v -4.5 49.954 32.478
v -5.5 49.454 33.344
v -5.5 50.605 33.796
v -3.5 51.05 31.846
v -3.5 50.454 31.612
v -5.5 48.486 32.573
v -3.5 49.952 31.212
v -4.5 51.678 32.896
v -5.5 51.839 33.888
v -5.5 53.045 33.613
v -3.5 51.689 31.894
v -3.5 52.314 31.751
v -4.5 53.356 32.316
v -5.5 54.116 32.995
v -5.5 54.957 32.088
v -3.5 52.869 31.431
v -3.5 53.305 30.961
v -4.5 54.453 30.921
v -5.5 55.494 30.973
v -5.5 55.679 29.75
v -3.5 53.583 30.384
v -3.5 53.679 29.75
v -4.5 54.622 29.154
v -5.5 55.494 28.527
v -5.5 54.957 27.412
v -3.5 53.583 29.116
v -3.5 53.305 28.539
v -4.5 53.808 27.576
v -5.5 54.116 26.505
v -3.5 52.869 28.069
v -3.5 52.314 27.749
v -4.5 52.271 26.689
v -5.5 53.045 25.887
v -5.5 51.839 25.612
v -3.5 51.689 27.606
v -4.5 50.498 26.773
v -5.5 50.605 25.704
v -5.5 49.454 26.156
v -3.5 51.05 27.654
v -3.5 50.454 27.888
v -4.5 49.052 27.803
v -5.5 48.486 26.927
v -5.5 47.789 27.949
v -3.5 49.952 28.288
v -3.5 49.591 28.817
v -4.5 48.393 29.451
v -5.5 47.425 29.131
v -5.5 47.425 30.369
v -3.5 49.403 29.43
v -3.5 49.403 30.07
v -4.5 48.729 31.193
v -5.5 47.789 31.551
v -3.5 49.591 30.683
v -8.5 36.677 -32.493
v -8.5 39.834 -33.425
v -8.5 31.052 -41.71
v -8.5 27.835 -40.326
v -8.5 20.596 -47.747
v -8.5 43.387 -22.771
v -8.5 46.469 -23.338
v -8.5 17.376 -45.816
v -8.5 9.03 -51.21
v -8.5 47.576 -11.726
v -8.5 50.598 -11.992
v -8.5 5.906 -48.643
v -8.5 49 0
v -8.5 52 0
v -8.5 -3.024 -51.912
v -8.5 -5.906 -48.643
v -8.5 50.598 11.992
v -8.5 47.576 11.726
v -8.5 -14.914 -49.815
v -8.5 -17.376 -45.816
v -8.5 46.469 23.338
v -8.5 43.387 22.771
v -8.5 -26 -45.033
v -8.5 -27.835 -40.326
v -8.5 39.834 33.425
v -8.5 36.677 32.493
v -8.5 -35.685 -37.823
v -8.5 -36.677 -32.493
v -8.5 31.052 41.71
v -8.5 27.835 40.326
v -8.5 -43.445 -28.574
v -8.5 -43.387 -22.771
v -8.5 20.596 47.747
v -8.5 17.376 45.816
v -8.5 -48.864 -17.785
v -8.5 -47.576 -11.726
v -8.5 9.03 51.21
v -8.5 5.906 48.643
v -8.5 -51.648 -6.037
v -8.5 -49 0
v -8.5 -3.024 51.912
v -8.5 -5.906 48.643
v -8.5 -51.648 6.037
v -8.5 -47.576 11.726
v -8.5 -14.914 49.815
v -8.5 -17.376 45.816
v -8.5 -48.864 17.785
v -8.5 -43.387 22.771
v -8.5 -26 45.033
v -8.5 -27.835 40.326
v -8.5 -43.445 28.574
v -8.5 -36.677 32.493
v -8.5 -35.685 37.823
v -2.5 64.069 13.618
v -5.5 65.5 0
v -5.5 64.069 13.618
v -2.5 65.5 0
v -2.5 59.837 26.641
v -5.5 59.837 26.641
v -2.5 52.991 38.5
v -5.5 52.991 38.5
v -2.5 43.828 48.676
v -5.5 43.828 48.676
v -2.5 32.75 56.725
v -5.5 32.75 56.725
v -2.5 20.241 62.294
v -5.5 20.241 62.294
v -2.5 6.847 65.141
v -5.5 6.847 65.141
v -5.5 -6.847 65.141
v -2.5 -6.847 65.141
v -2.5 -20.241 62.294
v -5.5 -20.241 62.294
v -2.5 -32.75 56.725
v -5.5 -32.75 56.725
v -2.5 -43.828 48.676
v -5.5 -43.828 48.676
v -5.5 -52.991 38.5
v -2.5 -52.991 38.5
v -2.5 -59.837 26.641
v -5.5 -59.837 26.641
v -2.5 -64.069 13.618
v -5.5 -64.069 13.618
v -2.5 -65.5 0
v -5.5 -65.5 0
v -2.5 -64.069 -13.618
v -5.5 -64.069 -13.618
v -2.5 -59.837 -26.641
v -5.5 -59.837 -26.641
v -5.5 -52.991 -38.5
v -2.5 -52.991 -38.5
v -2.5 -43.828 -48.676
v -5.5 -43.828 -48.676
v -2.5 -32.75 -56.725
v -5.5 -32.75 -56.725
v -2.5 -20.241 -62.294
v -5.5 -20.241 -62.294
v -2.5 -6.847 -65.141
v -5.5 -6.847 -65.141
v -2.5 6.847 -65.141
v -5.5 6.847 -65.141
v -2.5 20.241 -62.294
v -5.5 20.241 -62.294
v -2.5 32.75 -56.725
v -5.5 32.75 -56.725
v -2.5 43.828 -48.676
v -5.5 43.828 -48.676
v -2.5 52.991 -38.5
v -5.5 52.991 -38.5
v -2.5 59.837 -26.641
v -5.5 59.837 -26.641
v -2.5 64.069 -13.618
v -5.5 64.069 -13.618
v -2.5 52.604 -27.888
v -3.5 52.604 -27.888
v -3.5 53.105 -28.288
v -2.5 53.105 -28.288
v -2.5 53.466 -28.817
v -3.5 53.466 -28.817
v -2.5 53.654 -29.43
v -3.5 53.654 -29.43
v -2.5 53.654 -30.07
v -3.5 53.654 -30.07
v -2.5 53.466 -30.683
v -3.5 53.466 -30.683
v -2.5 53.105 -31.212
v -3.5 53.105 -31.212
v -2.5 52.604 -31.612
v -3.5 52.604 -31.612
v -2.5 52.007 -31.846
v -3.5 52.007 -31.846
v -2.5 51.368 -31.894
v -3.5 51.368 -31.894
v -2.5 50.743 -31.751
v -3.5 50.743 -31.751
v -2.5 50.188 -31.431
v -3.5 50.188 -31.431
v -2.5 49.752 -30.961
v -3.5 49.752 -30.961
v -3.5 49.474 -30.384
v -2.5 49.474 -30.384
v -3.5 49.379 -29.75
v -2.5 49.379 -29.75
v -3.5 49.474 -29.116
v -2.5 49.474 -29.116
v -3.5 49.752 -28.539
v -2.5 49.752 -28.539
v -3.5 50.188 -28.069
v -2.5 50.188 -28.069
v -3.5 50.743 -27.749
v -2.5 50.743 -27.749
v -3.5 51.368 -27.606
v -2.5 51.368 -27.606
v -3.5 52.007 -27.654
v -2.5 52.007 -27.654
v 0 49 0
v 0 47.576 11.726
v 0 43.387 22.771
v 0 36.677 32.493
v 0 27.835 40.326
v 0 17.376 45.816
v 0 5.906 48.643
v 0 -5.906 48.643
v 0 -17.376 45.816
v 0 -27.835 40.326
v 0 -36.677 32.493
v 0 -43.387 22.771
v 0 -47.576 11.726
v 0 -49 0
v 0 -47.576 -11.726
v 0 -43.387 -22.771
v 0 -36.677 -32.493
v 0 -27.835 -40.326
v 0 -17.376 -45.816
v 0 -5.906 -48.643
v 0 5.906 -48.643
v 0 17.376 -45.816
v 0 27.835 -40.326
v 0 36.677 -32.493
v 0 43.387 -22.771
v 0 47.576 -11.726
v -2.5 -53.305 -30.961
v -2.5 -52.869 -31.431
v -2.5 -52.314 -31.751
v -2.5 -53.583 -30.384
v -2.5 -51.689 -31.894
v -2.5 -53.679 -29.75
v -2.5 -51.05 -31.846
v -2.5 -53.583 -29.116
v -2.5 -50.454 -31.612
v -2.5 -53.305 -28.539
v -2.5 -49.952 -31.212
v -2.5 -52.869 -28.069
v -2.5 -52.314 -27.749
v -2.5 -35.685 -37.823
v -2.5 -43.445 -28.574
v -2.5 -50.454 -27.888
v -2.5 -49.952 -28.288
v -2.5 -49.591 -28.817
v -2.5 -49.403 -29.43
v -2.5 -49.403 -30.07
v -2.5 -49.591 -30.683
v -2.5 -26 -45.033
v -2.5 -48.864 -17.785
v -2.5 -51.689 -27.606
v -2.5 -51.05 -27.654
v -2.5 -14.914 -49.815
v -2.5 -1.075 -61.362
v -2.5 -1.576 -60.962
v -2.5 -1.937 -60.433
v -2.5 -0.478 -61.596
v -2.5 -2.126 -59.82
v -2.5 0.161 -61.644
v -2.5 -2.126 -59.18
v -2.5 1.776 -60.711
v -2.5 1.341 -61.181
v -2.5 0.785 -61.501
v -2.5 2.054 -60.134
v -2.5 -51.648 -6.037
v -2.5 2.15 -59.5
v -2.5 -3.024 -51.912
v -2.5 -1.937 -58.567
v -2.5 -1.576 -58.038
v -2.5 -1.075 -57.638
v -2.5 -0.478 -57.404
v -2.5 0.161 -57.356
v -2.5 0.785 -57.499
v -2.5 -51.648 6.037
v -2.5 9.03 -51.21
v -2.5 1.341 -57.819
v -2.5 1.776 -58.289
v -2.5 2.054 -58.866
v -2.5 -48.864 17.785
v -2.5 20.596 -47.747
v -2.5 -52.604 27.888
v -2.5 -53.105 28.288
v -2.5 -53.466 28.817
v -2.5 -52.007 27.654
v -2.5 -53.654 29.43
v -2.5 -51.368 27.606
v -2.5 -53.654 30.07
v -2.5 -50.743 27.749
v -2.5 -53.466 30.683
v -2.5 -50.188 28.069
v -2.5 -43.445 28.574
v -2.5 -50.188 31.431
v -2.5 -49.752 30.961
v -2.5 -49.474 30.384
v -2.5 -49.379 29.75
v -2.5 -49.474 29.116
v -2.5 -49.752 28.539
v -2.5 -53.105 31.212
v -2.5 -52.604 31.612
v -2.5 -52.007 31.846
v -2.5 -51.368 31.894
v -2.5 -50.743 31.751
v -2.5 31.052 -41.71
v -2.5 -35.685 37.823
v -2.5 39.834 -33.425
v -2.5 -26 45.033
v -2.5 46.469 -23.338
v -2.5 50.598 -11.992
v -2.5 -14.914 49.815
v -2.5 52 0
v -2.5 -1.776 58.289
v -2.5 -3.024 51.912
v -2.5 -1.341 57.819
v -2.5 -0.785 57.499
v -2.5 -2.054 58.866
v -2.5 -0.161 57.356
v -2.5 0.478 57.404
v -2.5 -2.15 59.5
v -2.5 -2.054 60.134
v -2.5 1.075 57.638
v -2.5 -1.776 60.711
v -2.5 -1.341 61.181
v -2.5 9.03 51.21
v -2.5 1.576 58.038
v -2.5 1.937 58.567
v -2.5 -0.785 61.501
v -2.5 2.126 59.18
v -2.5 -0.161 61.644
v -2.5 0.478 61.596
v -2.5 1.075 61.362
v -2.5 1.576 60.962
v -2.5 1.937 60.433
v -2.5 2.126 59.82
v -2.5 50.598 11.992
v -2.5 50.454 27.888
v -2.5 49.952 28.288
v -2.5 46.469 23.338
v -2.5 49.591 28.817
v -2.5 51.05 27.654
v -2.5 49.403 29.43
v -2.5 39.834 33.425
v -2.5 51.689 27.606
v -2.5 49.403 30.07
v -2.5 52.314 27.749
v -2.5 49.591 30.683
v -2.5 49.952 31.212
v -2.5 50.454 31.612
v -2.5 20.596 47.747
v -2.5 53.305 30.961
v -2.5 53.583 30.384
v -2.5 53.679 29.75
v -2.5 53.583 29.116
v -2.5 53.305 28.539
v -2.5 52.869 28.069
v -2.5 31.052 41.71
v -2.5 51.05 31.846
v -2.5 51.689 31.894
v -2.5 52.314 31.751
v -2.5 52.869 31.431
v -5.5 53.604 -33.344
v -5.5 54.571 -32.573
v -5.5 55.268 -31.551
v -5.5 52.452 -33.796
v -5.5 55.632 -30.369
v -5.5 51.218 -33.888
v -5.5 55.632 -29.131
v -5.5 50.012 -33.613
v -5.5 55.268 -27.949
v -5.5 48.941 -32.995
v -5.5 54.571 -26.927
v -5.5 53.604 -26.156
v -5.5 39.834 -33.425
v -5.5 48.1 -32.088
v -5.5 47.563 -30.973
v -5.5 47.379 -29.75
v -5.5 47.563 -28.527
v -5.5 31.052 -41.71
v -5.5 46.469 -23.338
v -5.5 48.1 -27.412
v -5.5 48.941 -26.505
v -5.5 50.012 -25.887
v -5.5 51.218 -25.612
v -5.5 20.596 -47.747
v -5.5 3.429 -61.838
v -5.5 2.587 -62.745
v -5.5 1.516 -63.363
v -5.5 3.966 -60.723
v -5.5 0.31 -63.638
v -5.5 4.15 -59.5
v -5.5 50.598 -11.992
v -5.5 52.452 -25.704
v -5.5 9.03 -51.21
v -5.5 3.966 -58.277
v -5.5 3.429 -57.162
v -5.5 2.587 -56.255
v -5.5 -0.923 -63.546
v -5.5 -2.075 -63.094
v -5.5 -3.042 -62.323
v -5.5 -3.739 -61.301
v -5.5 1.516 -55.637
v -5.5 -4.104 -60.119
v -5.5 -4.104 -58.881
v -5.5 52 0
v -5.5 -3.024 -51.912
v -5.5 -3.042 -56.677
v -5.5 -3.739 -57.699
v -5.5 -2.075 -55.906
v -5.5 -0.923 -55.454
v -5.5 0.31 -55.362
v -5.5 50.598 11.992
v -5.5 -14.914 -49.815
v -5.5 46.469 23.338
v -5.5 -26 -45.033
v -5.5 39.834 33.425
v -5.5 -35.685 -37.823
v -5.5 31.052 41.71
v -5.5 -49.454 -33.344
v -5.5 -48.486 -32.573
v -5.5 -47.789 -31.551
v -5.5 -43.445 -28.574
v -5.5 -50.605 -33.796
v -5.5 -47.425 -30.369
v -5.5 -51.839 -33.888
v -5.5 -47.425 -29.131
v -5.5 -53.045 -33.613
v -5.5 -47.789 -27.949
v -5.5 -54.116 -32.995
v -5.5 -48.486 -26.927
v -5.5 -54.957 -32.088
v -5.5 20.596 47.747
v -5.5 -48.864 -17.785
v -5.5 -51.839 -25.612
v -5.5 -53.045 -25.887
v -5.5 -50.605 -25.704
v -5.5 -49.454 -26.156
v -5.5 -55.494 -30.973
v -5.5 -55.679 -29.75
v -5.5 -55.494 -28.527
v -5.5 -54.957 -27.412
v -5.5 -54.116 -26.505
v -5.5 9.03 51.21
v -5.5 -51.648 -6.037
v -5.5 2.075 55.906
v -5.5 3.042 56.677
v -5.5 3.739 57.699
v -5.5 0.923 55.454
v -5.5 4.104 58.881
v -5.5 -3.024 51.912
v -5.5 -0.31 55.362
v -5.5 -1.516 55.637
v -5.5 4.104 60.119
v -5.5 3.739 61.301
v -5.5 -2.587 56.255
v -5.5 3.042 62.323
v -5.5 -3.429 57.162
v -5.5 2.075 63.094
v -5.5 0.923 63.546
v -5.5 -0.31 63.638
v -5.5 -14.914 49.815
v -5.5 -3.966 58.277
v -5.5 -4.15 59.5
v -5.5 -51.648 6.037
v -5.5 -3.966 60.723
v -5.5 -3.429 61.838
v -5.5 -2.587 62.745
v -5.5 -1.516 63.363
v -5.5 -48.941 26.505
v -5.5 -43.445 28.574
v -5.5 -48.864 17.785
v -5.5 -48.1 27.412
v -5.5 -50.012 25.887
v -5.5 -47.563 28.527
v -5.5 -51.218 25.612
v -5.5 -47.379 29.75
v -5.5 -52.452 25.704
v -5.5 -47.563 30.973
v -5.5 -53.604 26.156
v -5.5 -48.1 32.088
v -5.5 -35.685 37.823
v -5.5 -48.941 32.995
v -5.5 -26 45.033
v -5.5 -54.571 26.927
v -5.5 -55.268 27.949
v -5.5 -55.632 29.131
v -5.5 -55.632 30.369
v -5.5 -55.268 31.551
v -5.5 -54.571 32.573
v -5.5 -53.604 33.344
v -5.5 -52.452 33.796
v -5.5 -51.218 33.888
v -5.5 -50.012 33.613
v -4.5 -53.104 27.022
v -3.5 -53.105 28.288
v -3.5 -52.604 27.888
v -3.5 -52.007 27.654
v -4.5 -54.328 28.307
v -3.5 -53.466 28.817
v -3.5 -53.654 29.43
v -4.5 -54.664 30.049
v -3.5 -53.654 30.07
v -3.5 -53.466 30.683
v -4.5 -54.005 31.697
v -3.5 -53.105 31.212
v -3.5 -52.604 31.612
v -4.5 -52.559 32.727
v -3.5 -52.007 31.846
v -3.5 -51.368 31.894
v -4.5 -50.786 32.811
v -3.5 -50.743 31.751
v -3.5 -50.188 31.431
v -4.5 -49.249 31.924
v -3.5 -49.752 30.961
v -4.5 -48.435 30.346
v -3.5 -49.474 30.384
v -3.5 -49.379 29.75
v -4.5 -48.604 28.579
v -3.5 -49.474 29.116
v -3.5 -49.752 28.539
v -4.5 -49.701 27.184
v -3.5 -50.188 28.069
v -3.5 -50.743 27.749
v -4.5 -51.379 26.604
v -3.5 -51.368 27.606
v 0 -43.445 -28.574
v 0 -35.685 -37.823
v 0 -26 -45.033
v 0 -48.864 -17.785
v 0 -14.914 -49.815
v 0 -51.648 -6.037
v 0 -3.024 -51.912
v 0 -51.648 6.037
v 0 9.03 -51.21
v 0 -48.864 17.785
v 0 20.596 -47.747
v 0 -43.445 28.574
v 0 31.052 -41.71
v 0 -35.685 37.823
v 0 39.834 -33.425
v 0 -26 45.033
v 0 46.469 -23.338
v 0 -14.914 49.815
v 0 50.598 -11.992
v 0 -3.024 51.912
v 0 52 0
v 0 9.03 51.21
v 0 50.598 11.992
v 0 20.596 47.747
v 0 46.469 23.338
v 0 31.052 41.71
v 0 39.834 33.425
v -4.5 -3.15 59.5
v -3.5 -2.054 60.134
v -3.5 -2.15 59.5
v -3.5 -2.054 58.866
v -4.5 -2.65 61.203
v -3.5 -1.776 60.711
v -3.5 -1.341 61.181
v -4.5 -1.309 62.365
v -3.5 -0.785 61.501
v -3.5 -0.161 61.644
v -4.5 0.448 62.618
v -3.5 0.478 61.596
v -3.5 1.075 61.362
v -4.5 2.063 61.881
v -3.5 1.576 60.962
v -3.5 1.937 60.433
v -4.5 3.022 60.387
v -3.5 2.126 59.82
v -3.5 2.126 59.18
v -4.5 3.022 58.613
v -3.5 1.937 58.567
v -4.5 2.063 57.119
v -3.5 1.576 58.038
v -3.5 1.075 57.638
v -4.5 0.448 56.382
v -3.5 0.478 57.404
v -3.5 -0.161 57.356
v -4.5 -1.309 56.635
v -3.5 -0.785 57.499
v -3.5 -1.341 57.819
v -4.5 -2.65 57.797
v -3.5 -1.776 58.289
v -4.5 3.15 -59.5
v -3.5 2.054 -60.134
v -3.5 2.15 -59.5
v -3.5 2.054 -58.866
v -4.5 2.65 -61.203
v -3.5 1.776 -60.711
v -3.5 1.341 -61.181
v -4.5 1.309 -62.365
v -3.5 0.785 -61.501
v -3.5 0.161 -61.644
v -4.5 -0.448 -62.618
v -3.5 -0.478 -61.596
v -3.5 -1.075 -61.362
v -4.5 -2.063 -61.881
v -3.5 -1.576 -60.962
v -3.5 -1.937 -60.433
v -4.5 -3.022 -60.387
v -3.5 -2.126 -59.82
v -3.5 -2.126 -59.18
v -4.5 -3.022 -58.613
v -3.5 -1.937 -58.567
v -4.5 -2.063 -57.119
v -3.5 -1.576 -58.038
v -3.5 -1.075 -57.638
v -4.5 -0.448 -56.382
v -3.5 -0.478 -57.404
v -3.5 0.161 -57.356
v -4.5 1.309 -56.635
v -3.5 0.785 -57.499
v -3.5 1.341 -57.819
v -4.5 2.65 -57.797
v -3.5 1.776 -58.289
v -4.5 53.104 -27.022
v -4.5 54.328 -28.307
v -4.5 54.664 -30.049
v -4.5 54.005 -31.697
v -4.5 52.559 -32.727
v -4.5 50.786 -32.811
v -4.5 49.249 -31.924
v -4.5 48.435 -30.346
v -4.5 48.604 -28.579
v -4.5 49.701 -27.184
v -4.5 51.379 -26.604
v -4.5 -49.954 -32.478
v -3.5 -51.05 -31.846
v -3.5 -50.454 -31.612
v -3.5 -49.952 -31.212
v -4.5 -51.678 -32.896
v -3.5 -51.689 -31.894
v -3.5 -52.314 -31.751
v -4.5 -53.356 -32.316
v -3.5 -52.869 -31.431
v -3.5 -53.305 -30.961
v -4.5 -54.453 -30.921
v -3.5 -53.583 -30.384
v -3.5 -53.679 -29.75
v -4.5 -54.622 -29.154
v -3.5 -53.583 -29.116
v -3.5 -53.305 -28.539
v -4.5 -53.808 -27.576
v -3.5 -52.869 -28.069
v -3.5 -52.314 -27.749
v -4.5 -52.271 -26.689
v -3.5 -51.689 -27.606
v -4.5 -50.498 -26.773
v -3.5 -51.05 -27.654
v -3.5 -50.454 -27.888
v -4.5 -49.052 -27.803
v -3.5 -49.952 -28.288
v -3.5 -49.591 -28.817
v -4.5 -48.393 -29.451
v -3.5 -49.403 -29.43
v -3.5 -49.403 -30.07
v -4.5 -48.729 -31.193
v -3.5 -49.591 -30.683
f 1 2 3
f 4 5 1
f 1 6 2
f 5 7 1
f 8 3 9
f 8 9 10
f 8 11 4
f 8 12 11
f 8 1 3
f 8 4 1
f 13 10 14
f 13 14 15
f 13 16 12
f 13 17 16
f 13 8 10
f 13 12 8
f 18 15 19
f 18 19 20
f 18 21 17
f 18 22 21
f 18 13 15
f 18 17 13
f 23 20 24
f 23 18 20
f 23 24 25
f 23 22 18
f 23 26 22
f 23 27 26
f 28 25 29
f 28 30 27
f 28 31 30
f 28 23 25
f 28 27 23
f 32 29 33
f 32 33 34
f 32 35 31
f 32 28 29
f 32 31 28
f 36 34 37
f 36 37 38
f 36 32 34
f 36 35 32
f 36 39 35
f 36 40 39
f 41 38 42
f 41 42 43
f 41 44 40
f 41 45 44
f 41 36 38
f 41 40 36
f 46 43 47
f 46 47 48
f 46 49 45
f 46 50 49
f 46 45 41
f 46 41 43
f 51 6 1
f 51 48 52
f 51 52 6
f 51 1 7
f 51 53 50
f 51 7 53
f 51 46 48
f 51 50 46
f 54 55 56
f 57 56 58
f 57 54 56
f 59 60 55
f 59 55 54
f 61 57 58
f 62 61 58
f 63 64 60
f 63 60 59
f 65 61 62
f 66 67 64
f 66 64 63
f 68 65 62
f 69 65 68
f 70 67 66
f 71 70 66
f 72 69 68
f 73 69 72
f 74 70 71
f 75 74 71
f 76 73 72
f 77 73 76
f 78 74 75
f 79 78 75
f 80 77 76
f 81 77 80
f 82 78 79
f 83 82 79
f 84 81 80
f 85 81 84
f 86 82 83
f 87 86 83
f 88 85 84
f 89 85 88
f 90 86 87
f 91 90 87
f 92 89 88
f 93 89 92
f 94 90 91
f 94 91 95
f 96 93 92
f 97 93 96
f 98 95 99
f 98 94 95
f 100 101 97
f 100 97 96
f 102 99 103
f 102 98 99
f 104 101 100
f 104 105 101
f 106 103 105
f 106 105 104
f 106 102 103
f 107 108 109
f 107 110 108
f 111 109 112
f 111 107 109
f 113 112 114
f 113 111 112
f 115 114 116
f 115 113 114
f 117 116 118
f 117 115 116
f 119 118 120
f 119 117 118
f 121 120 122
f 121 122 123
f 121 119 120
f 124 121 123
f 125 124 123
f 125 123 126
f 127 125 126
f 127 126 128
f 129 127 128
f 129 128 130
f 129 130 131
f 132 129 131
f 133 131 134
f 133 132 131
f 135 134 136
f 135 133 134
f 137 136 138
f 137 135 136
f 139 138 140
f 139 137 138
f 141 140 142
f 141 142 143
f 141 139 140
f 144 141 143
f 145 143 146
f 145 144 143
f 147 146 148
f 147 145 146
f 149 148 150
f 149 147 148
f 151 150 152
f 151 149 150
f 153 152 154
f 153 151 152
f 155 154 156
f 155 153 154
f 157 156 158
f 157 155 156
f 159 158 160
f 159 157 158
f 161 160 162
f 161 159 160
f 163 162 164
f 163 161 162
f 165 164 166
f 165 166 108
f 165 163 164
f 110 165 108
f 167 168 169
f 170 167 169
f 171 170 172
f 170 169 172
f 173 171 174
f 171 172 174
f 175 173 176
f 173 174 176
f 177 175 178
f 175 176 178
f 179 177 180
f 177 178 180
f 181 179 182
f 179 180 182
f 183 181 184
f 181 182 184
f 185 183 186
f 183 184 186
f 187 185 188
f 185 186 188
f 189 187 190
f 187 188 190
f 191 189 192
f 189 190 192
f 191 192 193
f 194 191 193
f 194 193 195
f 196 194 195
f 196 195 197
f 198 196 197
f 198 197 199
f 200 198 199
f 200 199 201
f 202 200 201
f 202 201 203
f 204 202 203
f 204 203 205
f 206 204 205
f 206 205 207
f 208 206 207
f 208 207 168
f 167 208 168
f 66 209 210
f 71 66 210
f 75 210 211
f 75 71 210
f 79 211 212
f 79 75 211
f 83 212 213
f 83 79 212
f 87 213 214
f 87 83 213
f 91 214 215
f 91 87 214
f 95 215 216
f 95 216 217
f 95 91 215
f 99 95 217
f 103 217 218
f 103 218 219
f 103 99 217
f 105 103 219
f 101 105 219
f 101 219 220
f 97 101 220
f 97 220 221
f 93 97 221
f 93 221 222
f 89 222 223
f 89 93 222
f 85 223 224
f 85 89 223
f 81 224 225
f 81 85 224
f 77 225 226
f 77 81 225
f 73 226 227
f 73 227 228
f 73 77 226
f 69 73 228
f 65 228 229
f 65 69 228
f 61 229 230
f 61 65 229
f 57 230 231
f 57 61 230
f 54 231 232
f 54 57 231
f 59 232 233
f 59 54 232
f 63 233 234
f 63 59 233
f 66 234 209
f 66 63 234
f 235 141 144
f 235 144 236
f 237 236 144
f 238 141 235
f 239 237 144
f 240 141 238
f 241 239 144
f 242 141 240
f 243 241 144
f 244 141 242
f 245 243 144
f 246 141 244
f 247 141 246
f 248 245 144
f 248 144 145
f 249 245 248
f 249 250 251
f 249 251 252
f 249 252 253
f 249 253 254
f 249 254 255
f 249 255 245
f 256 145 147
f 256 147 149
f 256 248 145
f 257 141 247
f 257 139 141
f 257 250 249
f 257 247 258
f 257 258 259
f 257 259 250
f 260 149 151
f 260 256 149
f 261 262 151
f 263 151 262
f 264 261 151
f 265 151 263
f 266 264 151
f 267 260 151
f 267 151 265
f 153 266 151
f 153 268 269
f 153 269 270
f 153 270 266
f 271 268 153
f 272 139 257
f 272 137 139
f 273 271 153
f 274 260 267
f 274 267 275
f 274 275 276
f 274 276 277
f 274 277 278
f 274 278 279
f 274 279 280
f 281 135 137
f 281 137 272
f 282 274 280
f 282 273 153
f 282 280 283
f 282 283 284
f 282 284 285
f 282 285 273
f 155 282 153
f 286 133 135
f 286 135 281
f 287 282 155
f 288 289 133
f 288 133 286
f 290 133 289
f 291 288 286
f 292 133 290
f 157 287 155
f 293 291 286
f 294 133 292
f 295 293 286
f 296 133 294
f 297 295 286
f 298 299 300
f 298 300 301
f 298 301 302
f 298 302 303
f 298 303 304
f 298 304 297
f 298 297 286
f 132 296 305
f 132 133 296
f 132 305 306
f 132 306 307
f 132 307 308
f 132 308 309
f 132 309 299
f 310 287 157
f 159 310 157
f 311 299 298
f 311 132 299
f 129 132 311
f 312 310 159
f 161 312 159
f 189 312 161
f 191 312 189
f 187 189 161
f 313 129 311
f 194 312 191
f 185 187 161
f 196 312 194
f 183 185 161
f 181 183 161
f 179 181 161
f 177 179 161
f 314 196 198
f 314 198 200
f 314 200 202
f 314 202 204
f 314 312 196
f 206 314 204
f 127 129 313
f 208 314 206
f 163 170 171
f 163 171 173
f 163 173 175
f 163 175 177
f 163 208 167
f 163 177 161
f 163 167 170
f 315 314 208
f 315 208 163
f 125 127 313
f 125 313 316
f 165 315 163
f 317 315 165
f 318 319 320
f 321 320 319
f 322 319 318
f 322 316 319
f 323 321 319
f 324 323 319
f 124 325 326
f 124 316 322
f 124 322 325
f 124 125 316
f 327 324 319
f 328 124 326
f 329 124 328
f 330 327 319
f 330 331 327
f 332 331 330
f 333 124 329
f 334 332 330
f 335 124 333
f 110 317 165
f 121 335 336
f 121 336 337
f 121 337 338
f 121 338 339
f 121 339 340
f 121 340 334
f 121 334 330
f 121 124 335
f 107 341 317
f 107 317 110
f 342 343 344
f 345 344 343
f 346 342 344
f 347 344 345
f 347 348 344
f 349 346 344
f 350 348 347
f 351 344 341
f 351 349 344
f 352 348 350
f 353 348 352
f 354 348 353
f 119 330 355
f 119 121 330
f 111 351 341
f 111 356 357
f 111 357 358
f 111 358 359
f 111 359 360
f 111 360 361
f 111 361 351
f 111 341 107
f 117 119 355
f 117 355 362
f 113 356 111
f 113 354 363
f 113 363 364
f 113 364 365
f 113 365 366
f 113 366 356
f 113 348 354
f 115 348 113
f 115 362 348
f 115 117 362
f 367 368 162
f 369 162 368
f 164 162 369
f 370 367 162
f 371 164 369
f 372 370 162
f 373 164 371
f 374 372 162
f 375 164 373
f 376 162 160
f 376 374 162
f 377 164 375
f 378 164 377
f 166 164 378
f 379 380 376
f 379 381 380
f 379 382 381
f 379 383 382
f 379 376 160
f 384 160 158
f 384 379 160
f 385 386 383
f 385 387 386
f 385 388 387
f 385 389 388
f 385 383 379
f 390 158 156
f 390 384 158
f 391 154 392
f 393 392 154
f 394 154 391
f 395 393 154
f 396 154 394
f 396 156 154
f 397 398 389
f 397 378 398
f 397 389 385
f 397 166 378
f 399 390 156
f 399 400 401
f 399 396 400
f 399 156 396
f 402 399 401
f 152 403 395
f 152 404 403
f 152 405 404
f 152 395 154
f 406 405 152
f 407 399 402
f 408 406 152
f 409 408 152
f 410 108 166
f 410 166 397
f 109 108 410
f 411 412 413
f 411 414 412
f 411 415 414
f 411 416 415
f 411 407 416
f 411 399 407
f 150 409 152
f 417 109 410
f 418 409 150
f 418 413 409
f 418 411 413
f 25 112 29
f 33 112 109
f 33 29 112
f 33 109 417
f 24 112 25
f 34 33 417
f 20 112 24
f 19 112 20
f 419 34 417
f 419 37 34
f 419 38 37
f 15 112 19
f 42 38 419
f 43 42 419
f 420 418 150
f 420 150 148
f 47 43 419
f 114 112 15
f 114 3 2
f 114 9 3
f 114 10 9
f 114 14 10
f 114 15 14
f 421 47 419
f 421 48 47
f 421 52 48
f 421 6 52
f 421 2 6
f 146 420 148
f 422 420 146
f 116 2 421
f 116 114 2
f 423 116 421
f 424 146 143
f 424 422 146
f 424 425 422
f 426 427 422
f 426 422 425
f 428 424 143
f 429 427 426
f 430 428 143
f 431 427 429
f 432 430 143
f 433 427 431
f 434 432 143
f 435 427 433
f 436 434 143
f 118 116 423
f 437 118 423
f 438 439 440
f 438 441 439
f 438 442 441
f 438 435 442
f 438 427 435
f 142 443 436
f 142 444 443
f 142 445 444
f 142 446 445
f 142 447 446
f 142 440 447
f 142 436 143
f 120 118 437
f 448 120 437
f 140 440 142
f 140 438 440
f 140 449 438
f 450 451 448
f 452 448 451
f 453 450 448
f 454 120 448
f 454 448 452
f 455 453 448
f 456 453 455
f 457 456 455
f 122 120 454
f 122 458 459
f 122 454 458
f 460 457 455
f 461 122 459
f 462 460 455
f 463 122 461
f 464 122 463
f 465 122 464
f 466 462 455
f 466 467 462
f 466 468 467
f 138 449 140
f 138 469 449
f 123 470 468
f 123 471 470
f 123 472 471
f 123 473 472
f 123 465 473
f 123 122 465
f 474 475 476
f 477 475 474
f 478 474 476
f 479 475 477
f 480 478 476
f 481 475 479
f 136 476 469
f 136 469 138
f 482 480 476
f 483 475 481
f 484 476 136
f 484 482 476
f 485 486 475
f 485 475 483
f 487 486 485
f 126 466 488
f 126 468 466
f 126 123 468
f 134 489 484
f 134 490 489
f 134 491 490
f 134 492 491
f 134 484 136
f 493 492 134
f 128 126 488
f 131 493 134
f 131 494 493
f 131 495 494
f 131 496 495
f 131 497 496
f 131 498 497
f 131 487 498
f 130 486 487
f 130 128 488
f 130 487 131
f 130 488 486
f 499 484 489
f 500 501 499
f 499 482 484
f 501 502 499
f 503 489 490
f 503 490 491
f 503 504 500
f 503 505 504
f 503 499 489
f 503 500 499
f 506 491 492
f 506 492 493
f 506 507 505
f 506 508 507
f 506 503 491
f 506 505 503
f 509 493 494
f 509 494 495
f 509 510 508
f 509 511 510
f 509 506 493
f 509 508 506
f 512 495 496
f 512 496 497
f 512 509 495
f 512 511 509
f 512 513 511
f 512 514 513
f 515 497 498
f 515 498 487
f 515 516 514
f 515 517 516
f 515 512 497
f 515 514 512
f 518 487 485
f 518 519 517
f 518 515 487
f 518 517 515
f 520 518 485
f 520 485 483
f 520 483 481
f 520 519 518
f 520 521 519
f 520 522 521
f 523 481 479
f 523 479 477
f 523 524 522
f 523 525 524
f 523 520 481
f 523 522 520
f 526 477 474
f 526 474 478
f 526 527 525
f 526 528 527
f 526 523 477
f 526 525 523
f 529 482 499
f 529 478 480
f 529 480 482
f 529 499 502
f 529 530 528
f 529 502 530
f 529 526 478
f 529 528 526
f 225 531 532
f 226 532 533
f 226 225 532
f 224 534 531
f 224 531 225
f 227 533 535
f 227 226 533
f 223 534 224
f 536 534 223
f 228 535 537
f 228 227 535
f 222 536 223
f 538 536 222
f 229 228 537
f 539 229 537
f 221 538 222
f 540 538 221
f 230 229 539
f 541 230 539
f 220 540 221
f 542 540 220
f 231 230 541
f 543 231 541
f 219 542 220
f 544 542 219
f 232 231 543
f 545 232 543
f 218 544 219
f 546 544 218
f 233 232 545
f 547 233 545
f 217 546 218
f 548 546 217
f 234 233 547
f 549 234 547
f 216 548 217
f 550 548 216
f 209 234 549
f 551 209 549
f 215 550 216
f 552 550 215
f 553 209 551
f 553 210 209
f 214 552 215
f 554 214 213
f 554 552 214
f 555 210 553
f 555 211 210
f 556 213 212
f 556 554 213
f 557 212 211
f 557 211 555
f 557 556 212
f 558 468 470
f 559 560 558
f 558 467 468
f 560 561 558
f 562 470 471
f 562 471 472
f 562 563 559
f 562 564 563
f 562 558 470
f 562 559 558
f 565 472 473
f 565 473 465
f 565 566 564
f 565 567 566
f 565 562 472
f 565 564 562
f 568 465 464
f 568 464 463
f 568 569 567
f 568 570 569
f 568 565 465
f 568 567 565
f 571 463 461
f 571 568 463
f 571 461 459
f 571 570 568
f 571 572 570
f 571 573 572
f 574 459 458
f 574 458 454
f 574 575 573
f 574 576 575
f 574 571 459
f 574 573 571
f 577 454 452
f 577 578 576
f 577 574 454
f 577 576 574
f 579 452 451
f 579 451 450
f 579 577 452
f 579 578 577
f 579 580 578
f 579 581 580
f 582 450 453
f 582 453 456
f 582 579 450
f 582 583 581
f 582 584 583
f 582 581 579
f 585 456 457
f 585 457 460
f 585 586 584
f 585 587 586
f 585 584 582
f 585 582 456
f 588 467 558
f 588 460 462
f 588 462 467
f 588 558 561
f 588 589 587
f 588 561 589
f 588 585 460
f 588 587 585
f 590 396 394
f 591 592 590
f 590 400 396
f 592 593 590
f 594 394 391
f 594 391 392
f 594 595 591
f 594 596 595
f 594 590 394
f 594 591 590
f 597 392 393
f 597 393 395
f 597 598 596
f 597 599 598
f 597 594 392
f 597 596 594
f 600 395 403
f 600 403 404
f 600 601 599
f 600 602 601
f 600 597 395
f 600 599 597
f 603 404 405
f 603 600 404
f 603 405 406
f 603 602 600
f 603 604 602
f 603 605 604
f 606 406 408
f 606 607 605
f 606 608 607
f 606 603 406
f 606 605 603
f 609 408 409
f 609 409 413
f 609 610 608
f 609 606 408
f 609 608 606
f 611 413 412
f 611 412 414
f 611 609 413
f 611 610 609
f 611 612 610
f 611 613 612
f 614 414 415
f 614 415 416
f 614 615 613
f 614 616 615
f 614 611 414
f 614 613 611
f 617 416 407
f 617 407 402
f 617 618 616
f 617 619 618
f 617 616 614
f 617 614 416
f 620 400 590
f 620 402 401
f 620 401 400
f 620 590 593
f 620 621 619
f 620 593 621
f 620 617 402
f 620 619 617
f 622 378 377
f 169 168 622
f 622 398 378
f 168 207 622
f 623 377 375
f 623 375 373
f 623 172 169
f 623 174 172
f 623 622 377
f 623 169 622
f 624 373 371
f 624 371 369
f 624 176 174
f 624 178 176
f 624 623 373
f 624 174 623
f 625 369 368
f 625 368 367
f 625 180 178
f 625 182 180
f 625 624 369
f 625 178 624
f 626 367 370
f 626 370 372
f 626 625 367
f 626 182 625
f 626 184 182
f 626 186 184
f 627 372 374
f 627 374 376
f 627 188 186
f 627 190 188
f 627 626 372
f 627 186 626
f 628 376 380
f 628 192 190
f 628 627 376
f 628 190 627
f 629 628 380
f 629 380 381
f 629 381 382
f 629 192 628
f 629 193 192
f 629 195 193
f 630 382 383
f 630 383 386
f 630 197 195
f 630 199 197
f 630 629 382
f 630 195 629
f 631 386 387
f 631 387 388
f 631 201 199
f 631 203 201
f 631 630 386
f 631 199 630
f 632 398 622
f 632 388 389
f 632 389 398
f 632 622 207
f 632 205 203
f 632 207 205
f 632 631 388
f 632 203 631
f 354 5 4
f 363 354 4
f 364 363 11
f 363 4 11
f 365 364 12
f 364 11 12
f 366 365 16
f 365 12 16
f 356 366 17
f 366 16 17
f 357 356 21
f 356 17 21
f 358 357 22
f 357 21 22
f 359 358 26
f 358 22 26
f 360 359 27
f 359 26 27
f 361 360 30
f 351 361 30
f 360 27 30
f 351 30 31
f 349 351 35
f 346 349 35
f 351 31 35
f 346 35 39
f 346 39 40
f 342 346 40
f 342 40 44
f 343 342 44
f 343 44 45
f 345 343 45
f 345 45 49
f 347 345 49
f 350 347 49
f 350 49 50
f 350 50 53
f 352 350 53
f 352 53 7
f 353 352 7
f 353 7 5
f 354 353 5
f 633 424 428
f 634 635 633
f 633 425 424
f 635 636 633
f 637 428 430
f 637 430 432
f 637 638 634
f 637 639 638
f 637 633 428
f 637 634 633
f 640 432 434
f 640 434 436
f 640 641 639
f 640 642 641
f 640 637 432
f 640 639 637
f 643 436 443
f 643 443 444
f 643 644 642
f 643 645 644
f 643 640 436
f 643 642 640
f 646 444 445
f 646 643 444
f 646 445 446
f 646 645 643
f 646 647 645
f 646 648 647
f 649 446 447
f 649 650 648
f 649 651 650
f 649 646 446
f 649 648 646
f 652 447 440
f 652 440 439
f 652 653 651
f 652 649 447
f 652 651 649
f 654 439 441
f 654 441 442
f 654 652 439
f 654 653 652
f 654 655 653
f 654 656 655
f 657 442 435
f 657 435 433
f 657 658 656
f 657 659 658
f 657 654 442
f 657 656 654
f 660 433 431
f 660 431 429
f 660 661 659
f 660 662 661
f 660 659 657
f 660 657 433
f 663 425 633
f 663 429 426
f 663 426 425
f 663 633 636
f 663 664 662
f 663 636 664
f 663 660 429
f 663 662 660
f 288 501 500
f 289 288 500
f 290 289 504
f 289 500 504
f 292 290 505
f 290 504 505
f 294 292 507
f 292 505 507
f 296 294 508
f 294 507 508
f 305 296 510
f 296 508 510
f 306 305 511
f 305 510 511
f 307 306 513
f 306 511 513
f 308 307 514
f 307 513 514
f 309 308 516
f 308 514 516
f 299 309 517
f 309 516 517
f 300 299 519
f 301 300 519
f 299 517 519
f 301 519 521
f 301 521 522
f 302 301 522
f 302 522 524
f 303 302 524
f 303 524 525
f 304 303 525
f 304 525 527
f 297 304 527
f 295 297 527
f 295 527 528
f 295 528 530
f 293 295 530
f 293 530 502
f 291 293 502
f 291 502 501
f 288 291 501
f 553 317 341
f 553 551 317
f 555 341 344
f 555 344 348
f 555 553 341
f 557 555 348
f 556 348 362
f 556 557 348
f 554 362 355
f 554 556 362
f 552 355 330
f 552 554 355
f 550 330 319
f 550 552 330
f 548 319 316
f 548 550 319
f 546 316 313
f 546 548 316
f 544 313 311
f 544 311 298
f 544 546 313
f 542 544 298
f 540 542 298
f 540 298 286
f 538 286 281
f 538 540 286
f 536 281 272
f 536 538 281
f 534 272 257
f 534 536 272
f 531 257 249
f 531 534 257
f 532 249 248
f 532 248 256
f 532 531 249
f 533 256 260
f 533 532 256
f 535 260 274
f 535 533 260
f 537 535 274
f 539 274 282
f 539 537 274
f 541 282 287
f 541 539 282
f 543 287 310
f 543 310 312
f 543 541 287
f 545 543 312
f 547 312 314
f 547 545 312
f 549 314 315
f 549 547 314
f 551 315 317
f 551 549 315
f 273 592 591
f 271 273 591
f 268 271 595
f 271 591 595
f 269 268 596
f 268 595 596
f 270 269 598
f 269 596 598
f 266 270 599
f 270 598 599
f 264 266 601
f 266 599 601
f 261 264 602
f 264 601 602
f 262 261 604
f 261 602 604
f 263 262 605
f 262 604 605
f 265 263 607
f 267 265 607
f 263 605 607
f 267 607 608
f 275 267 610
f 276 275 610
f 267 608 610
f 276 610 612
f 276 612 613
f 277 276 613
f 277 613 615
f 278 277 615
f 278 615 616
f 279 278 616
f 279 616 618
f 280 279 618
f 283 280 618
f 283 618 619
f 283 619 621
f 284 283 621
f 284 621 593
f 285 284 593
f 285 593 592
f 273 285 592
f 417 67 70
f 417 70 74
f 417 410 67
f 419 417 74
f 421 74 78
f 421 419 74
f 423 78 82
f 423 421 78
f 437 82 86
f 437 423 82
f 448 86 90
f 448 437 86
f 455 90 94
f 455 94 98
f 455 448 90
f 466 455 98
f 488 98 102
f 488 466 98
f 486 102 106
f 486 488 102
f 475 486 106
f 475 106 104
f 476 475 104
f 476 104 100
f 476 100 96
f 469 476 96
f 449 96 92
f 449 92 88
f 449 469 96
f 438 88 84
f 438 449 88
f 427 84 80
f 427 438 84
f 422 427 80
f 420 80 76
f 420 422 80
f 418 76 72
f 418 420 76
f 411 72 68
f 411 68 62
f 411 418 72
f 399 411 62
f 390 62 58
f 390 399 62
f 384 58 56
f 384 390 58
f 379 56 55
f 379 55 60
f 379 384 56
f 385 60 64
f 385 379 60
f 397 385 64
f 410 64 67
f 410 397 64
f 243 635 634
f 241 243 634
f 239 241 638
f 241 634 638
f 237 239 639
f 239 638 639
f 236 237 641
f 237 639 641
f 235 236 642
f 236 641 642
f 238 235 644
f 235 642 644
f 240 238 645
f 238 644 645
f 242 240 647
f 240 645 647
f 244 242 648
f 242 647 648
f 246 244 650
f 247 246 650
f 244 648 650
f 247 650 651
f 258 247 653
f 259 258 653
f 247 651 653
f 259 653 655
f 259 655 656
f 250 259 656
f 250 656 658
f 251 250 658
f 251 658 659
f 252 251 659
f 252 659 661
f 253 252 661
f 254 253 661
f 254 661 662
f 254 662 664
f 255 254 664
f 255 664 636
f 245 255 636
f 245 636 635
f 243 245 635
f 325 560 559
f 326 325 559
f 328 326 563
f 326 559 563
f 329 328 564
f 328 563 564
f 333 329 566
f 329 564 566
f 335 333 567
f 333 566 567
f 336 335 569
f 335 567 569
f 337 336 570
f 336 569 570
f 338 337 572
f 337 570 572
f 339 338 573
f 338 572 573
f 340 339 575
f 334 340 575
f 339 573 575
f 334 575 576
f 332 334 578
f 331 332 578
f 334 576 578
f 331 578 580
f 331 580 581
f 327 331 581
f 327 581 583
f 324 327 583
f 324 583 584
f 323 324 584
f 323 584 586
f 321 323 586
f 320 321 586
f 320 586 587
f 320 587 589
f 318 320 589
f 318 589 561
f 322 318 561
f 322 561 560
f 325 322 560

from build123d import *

# Parameters (mm, degrees)
SKETCH001_R        = 2.15
POCKET_DEPTH       = 5
POLARPATTERN_COUNT = 6
CHAMFER_SIZE       = 2


with BuildPart() as part:
    # Sketch → Revolution (revolve)
    with BuildSketch(Plane.XY):
        Polygon((-8.5, 52), (-5.5, 52), (-5.5, 65.5), (-2.5, 65.5), (-2.5, 52), (0, 52), (0, 49), (-8.5, 49), align=None)
    revolve(axis=Axis((0, 0, 0), (1, 0, 0)))

    # Sketch001 → Pocket (cut)
    with BuildSketch(Plane(origin=(-5.5, 0, 0), x_dir=(0, -1, 0), z_dir=(-1, 0, 0))):
        with Locations((0, 59.5)):
            Circle(SKETCH001_R)
    pocket = extrude(amount=-POCKET_DEPTH, mode=Mode.SUBTRACT)

    # PolarPattern: Pocket ×6 about axis
    polarpattern_axis = Axis((-5.5, 0, 0), (-1, 0, 0))
    for i in range(1, POLARPATTERN_COUNT):
        add(pocket.rotate(polarpattern_axis, i * 360 / POLARPATTERN_COUNT), mode=Mode.SUBTRACT)

    # Chamfer
    chamfer_edges = [part.edges().sort_by_distance(p)[0] for p in [
        (-5.5, 2.15, 59.5),
        (-5.5, 52.603512, 27.888045),
        (-5.5, 50.453512, -31.611955),
        (-5.5, -2.15, -59.5),
        (-5.5, -52.603512, -27.888045),
        (-5.5, -50.453512, 31.611955),
    ]]
    chamfer(chamfer_edges, length=CHAMFER_SIZE)


solid = part.part
